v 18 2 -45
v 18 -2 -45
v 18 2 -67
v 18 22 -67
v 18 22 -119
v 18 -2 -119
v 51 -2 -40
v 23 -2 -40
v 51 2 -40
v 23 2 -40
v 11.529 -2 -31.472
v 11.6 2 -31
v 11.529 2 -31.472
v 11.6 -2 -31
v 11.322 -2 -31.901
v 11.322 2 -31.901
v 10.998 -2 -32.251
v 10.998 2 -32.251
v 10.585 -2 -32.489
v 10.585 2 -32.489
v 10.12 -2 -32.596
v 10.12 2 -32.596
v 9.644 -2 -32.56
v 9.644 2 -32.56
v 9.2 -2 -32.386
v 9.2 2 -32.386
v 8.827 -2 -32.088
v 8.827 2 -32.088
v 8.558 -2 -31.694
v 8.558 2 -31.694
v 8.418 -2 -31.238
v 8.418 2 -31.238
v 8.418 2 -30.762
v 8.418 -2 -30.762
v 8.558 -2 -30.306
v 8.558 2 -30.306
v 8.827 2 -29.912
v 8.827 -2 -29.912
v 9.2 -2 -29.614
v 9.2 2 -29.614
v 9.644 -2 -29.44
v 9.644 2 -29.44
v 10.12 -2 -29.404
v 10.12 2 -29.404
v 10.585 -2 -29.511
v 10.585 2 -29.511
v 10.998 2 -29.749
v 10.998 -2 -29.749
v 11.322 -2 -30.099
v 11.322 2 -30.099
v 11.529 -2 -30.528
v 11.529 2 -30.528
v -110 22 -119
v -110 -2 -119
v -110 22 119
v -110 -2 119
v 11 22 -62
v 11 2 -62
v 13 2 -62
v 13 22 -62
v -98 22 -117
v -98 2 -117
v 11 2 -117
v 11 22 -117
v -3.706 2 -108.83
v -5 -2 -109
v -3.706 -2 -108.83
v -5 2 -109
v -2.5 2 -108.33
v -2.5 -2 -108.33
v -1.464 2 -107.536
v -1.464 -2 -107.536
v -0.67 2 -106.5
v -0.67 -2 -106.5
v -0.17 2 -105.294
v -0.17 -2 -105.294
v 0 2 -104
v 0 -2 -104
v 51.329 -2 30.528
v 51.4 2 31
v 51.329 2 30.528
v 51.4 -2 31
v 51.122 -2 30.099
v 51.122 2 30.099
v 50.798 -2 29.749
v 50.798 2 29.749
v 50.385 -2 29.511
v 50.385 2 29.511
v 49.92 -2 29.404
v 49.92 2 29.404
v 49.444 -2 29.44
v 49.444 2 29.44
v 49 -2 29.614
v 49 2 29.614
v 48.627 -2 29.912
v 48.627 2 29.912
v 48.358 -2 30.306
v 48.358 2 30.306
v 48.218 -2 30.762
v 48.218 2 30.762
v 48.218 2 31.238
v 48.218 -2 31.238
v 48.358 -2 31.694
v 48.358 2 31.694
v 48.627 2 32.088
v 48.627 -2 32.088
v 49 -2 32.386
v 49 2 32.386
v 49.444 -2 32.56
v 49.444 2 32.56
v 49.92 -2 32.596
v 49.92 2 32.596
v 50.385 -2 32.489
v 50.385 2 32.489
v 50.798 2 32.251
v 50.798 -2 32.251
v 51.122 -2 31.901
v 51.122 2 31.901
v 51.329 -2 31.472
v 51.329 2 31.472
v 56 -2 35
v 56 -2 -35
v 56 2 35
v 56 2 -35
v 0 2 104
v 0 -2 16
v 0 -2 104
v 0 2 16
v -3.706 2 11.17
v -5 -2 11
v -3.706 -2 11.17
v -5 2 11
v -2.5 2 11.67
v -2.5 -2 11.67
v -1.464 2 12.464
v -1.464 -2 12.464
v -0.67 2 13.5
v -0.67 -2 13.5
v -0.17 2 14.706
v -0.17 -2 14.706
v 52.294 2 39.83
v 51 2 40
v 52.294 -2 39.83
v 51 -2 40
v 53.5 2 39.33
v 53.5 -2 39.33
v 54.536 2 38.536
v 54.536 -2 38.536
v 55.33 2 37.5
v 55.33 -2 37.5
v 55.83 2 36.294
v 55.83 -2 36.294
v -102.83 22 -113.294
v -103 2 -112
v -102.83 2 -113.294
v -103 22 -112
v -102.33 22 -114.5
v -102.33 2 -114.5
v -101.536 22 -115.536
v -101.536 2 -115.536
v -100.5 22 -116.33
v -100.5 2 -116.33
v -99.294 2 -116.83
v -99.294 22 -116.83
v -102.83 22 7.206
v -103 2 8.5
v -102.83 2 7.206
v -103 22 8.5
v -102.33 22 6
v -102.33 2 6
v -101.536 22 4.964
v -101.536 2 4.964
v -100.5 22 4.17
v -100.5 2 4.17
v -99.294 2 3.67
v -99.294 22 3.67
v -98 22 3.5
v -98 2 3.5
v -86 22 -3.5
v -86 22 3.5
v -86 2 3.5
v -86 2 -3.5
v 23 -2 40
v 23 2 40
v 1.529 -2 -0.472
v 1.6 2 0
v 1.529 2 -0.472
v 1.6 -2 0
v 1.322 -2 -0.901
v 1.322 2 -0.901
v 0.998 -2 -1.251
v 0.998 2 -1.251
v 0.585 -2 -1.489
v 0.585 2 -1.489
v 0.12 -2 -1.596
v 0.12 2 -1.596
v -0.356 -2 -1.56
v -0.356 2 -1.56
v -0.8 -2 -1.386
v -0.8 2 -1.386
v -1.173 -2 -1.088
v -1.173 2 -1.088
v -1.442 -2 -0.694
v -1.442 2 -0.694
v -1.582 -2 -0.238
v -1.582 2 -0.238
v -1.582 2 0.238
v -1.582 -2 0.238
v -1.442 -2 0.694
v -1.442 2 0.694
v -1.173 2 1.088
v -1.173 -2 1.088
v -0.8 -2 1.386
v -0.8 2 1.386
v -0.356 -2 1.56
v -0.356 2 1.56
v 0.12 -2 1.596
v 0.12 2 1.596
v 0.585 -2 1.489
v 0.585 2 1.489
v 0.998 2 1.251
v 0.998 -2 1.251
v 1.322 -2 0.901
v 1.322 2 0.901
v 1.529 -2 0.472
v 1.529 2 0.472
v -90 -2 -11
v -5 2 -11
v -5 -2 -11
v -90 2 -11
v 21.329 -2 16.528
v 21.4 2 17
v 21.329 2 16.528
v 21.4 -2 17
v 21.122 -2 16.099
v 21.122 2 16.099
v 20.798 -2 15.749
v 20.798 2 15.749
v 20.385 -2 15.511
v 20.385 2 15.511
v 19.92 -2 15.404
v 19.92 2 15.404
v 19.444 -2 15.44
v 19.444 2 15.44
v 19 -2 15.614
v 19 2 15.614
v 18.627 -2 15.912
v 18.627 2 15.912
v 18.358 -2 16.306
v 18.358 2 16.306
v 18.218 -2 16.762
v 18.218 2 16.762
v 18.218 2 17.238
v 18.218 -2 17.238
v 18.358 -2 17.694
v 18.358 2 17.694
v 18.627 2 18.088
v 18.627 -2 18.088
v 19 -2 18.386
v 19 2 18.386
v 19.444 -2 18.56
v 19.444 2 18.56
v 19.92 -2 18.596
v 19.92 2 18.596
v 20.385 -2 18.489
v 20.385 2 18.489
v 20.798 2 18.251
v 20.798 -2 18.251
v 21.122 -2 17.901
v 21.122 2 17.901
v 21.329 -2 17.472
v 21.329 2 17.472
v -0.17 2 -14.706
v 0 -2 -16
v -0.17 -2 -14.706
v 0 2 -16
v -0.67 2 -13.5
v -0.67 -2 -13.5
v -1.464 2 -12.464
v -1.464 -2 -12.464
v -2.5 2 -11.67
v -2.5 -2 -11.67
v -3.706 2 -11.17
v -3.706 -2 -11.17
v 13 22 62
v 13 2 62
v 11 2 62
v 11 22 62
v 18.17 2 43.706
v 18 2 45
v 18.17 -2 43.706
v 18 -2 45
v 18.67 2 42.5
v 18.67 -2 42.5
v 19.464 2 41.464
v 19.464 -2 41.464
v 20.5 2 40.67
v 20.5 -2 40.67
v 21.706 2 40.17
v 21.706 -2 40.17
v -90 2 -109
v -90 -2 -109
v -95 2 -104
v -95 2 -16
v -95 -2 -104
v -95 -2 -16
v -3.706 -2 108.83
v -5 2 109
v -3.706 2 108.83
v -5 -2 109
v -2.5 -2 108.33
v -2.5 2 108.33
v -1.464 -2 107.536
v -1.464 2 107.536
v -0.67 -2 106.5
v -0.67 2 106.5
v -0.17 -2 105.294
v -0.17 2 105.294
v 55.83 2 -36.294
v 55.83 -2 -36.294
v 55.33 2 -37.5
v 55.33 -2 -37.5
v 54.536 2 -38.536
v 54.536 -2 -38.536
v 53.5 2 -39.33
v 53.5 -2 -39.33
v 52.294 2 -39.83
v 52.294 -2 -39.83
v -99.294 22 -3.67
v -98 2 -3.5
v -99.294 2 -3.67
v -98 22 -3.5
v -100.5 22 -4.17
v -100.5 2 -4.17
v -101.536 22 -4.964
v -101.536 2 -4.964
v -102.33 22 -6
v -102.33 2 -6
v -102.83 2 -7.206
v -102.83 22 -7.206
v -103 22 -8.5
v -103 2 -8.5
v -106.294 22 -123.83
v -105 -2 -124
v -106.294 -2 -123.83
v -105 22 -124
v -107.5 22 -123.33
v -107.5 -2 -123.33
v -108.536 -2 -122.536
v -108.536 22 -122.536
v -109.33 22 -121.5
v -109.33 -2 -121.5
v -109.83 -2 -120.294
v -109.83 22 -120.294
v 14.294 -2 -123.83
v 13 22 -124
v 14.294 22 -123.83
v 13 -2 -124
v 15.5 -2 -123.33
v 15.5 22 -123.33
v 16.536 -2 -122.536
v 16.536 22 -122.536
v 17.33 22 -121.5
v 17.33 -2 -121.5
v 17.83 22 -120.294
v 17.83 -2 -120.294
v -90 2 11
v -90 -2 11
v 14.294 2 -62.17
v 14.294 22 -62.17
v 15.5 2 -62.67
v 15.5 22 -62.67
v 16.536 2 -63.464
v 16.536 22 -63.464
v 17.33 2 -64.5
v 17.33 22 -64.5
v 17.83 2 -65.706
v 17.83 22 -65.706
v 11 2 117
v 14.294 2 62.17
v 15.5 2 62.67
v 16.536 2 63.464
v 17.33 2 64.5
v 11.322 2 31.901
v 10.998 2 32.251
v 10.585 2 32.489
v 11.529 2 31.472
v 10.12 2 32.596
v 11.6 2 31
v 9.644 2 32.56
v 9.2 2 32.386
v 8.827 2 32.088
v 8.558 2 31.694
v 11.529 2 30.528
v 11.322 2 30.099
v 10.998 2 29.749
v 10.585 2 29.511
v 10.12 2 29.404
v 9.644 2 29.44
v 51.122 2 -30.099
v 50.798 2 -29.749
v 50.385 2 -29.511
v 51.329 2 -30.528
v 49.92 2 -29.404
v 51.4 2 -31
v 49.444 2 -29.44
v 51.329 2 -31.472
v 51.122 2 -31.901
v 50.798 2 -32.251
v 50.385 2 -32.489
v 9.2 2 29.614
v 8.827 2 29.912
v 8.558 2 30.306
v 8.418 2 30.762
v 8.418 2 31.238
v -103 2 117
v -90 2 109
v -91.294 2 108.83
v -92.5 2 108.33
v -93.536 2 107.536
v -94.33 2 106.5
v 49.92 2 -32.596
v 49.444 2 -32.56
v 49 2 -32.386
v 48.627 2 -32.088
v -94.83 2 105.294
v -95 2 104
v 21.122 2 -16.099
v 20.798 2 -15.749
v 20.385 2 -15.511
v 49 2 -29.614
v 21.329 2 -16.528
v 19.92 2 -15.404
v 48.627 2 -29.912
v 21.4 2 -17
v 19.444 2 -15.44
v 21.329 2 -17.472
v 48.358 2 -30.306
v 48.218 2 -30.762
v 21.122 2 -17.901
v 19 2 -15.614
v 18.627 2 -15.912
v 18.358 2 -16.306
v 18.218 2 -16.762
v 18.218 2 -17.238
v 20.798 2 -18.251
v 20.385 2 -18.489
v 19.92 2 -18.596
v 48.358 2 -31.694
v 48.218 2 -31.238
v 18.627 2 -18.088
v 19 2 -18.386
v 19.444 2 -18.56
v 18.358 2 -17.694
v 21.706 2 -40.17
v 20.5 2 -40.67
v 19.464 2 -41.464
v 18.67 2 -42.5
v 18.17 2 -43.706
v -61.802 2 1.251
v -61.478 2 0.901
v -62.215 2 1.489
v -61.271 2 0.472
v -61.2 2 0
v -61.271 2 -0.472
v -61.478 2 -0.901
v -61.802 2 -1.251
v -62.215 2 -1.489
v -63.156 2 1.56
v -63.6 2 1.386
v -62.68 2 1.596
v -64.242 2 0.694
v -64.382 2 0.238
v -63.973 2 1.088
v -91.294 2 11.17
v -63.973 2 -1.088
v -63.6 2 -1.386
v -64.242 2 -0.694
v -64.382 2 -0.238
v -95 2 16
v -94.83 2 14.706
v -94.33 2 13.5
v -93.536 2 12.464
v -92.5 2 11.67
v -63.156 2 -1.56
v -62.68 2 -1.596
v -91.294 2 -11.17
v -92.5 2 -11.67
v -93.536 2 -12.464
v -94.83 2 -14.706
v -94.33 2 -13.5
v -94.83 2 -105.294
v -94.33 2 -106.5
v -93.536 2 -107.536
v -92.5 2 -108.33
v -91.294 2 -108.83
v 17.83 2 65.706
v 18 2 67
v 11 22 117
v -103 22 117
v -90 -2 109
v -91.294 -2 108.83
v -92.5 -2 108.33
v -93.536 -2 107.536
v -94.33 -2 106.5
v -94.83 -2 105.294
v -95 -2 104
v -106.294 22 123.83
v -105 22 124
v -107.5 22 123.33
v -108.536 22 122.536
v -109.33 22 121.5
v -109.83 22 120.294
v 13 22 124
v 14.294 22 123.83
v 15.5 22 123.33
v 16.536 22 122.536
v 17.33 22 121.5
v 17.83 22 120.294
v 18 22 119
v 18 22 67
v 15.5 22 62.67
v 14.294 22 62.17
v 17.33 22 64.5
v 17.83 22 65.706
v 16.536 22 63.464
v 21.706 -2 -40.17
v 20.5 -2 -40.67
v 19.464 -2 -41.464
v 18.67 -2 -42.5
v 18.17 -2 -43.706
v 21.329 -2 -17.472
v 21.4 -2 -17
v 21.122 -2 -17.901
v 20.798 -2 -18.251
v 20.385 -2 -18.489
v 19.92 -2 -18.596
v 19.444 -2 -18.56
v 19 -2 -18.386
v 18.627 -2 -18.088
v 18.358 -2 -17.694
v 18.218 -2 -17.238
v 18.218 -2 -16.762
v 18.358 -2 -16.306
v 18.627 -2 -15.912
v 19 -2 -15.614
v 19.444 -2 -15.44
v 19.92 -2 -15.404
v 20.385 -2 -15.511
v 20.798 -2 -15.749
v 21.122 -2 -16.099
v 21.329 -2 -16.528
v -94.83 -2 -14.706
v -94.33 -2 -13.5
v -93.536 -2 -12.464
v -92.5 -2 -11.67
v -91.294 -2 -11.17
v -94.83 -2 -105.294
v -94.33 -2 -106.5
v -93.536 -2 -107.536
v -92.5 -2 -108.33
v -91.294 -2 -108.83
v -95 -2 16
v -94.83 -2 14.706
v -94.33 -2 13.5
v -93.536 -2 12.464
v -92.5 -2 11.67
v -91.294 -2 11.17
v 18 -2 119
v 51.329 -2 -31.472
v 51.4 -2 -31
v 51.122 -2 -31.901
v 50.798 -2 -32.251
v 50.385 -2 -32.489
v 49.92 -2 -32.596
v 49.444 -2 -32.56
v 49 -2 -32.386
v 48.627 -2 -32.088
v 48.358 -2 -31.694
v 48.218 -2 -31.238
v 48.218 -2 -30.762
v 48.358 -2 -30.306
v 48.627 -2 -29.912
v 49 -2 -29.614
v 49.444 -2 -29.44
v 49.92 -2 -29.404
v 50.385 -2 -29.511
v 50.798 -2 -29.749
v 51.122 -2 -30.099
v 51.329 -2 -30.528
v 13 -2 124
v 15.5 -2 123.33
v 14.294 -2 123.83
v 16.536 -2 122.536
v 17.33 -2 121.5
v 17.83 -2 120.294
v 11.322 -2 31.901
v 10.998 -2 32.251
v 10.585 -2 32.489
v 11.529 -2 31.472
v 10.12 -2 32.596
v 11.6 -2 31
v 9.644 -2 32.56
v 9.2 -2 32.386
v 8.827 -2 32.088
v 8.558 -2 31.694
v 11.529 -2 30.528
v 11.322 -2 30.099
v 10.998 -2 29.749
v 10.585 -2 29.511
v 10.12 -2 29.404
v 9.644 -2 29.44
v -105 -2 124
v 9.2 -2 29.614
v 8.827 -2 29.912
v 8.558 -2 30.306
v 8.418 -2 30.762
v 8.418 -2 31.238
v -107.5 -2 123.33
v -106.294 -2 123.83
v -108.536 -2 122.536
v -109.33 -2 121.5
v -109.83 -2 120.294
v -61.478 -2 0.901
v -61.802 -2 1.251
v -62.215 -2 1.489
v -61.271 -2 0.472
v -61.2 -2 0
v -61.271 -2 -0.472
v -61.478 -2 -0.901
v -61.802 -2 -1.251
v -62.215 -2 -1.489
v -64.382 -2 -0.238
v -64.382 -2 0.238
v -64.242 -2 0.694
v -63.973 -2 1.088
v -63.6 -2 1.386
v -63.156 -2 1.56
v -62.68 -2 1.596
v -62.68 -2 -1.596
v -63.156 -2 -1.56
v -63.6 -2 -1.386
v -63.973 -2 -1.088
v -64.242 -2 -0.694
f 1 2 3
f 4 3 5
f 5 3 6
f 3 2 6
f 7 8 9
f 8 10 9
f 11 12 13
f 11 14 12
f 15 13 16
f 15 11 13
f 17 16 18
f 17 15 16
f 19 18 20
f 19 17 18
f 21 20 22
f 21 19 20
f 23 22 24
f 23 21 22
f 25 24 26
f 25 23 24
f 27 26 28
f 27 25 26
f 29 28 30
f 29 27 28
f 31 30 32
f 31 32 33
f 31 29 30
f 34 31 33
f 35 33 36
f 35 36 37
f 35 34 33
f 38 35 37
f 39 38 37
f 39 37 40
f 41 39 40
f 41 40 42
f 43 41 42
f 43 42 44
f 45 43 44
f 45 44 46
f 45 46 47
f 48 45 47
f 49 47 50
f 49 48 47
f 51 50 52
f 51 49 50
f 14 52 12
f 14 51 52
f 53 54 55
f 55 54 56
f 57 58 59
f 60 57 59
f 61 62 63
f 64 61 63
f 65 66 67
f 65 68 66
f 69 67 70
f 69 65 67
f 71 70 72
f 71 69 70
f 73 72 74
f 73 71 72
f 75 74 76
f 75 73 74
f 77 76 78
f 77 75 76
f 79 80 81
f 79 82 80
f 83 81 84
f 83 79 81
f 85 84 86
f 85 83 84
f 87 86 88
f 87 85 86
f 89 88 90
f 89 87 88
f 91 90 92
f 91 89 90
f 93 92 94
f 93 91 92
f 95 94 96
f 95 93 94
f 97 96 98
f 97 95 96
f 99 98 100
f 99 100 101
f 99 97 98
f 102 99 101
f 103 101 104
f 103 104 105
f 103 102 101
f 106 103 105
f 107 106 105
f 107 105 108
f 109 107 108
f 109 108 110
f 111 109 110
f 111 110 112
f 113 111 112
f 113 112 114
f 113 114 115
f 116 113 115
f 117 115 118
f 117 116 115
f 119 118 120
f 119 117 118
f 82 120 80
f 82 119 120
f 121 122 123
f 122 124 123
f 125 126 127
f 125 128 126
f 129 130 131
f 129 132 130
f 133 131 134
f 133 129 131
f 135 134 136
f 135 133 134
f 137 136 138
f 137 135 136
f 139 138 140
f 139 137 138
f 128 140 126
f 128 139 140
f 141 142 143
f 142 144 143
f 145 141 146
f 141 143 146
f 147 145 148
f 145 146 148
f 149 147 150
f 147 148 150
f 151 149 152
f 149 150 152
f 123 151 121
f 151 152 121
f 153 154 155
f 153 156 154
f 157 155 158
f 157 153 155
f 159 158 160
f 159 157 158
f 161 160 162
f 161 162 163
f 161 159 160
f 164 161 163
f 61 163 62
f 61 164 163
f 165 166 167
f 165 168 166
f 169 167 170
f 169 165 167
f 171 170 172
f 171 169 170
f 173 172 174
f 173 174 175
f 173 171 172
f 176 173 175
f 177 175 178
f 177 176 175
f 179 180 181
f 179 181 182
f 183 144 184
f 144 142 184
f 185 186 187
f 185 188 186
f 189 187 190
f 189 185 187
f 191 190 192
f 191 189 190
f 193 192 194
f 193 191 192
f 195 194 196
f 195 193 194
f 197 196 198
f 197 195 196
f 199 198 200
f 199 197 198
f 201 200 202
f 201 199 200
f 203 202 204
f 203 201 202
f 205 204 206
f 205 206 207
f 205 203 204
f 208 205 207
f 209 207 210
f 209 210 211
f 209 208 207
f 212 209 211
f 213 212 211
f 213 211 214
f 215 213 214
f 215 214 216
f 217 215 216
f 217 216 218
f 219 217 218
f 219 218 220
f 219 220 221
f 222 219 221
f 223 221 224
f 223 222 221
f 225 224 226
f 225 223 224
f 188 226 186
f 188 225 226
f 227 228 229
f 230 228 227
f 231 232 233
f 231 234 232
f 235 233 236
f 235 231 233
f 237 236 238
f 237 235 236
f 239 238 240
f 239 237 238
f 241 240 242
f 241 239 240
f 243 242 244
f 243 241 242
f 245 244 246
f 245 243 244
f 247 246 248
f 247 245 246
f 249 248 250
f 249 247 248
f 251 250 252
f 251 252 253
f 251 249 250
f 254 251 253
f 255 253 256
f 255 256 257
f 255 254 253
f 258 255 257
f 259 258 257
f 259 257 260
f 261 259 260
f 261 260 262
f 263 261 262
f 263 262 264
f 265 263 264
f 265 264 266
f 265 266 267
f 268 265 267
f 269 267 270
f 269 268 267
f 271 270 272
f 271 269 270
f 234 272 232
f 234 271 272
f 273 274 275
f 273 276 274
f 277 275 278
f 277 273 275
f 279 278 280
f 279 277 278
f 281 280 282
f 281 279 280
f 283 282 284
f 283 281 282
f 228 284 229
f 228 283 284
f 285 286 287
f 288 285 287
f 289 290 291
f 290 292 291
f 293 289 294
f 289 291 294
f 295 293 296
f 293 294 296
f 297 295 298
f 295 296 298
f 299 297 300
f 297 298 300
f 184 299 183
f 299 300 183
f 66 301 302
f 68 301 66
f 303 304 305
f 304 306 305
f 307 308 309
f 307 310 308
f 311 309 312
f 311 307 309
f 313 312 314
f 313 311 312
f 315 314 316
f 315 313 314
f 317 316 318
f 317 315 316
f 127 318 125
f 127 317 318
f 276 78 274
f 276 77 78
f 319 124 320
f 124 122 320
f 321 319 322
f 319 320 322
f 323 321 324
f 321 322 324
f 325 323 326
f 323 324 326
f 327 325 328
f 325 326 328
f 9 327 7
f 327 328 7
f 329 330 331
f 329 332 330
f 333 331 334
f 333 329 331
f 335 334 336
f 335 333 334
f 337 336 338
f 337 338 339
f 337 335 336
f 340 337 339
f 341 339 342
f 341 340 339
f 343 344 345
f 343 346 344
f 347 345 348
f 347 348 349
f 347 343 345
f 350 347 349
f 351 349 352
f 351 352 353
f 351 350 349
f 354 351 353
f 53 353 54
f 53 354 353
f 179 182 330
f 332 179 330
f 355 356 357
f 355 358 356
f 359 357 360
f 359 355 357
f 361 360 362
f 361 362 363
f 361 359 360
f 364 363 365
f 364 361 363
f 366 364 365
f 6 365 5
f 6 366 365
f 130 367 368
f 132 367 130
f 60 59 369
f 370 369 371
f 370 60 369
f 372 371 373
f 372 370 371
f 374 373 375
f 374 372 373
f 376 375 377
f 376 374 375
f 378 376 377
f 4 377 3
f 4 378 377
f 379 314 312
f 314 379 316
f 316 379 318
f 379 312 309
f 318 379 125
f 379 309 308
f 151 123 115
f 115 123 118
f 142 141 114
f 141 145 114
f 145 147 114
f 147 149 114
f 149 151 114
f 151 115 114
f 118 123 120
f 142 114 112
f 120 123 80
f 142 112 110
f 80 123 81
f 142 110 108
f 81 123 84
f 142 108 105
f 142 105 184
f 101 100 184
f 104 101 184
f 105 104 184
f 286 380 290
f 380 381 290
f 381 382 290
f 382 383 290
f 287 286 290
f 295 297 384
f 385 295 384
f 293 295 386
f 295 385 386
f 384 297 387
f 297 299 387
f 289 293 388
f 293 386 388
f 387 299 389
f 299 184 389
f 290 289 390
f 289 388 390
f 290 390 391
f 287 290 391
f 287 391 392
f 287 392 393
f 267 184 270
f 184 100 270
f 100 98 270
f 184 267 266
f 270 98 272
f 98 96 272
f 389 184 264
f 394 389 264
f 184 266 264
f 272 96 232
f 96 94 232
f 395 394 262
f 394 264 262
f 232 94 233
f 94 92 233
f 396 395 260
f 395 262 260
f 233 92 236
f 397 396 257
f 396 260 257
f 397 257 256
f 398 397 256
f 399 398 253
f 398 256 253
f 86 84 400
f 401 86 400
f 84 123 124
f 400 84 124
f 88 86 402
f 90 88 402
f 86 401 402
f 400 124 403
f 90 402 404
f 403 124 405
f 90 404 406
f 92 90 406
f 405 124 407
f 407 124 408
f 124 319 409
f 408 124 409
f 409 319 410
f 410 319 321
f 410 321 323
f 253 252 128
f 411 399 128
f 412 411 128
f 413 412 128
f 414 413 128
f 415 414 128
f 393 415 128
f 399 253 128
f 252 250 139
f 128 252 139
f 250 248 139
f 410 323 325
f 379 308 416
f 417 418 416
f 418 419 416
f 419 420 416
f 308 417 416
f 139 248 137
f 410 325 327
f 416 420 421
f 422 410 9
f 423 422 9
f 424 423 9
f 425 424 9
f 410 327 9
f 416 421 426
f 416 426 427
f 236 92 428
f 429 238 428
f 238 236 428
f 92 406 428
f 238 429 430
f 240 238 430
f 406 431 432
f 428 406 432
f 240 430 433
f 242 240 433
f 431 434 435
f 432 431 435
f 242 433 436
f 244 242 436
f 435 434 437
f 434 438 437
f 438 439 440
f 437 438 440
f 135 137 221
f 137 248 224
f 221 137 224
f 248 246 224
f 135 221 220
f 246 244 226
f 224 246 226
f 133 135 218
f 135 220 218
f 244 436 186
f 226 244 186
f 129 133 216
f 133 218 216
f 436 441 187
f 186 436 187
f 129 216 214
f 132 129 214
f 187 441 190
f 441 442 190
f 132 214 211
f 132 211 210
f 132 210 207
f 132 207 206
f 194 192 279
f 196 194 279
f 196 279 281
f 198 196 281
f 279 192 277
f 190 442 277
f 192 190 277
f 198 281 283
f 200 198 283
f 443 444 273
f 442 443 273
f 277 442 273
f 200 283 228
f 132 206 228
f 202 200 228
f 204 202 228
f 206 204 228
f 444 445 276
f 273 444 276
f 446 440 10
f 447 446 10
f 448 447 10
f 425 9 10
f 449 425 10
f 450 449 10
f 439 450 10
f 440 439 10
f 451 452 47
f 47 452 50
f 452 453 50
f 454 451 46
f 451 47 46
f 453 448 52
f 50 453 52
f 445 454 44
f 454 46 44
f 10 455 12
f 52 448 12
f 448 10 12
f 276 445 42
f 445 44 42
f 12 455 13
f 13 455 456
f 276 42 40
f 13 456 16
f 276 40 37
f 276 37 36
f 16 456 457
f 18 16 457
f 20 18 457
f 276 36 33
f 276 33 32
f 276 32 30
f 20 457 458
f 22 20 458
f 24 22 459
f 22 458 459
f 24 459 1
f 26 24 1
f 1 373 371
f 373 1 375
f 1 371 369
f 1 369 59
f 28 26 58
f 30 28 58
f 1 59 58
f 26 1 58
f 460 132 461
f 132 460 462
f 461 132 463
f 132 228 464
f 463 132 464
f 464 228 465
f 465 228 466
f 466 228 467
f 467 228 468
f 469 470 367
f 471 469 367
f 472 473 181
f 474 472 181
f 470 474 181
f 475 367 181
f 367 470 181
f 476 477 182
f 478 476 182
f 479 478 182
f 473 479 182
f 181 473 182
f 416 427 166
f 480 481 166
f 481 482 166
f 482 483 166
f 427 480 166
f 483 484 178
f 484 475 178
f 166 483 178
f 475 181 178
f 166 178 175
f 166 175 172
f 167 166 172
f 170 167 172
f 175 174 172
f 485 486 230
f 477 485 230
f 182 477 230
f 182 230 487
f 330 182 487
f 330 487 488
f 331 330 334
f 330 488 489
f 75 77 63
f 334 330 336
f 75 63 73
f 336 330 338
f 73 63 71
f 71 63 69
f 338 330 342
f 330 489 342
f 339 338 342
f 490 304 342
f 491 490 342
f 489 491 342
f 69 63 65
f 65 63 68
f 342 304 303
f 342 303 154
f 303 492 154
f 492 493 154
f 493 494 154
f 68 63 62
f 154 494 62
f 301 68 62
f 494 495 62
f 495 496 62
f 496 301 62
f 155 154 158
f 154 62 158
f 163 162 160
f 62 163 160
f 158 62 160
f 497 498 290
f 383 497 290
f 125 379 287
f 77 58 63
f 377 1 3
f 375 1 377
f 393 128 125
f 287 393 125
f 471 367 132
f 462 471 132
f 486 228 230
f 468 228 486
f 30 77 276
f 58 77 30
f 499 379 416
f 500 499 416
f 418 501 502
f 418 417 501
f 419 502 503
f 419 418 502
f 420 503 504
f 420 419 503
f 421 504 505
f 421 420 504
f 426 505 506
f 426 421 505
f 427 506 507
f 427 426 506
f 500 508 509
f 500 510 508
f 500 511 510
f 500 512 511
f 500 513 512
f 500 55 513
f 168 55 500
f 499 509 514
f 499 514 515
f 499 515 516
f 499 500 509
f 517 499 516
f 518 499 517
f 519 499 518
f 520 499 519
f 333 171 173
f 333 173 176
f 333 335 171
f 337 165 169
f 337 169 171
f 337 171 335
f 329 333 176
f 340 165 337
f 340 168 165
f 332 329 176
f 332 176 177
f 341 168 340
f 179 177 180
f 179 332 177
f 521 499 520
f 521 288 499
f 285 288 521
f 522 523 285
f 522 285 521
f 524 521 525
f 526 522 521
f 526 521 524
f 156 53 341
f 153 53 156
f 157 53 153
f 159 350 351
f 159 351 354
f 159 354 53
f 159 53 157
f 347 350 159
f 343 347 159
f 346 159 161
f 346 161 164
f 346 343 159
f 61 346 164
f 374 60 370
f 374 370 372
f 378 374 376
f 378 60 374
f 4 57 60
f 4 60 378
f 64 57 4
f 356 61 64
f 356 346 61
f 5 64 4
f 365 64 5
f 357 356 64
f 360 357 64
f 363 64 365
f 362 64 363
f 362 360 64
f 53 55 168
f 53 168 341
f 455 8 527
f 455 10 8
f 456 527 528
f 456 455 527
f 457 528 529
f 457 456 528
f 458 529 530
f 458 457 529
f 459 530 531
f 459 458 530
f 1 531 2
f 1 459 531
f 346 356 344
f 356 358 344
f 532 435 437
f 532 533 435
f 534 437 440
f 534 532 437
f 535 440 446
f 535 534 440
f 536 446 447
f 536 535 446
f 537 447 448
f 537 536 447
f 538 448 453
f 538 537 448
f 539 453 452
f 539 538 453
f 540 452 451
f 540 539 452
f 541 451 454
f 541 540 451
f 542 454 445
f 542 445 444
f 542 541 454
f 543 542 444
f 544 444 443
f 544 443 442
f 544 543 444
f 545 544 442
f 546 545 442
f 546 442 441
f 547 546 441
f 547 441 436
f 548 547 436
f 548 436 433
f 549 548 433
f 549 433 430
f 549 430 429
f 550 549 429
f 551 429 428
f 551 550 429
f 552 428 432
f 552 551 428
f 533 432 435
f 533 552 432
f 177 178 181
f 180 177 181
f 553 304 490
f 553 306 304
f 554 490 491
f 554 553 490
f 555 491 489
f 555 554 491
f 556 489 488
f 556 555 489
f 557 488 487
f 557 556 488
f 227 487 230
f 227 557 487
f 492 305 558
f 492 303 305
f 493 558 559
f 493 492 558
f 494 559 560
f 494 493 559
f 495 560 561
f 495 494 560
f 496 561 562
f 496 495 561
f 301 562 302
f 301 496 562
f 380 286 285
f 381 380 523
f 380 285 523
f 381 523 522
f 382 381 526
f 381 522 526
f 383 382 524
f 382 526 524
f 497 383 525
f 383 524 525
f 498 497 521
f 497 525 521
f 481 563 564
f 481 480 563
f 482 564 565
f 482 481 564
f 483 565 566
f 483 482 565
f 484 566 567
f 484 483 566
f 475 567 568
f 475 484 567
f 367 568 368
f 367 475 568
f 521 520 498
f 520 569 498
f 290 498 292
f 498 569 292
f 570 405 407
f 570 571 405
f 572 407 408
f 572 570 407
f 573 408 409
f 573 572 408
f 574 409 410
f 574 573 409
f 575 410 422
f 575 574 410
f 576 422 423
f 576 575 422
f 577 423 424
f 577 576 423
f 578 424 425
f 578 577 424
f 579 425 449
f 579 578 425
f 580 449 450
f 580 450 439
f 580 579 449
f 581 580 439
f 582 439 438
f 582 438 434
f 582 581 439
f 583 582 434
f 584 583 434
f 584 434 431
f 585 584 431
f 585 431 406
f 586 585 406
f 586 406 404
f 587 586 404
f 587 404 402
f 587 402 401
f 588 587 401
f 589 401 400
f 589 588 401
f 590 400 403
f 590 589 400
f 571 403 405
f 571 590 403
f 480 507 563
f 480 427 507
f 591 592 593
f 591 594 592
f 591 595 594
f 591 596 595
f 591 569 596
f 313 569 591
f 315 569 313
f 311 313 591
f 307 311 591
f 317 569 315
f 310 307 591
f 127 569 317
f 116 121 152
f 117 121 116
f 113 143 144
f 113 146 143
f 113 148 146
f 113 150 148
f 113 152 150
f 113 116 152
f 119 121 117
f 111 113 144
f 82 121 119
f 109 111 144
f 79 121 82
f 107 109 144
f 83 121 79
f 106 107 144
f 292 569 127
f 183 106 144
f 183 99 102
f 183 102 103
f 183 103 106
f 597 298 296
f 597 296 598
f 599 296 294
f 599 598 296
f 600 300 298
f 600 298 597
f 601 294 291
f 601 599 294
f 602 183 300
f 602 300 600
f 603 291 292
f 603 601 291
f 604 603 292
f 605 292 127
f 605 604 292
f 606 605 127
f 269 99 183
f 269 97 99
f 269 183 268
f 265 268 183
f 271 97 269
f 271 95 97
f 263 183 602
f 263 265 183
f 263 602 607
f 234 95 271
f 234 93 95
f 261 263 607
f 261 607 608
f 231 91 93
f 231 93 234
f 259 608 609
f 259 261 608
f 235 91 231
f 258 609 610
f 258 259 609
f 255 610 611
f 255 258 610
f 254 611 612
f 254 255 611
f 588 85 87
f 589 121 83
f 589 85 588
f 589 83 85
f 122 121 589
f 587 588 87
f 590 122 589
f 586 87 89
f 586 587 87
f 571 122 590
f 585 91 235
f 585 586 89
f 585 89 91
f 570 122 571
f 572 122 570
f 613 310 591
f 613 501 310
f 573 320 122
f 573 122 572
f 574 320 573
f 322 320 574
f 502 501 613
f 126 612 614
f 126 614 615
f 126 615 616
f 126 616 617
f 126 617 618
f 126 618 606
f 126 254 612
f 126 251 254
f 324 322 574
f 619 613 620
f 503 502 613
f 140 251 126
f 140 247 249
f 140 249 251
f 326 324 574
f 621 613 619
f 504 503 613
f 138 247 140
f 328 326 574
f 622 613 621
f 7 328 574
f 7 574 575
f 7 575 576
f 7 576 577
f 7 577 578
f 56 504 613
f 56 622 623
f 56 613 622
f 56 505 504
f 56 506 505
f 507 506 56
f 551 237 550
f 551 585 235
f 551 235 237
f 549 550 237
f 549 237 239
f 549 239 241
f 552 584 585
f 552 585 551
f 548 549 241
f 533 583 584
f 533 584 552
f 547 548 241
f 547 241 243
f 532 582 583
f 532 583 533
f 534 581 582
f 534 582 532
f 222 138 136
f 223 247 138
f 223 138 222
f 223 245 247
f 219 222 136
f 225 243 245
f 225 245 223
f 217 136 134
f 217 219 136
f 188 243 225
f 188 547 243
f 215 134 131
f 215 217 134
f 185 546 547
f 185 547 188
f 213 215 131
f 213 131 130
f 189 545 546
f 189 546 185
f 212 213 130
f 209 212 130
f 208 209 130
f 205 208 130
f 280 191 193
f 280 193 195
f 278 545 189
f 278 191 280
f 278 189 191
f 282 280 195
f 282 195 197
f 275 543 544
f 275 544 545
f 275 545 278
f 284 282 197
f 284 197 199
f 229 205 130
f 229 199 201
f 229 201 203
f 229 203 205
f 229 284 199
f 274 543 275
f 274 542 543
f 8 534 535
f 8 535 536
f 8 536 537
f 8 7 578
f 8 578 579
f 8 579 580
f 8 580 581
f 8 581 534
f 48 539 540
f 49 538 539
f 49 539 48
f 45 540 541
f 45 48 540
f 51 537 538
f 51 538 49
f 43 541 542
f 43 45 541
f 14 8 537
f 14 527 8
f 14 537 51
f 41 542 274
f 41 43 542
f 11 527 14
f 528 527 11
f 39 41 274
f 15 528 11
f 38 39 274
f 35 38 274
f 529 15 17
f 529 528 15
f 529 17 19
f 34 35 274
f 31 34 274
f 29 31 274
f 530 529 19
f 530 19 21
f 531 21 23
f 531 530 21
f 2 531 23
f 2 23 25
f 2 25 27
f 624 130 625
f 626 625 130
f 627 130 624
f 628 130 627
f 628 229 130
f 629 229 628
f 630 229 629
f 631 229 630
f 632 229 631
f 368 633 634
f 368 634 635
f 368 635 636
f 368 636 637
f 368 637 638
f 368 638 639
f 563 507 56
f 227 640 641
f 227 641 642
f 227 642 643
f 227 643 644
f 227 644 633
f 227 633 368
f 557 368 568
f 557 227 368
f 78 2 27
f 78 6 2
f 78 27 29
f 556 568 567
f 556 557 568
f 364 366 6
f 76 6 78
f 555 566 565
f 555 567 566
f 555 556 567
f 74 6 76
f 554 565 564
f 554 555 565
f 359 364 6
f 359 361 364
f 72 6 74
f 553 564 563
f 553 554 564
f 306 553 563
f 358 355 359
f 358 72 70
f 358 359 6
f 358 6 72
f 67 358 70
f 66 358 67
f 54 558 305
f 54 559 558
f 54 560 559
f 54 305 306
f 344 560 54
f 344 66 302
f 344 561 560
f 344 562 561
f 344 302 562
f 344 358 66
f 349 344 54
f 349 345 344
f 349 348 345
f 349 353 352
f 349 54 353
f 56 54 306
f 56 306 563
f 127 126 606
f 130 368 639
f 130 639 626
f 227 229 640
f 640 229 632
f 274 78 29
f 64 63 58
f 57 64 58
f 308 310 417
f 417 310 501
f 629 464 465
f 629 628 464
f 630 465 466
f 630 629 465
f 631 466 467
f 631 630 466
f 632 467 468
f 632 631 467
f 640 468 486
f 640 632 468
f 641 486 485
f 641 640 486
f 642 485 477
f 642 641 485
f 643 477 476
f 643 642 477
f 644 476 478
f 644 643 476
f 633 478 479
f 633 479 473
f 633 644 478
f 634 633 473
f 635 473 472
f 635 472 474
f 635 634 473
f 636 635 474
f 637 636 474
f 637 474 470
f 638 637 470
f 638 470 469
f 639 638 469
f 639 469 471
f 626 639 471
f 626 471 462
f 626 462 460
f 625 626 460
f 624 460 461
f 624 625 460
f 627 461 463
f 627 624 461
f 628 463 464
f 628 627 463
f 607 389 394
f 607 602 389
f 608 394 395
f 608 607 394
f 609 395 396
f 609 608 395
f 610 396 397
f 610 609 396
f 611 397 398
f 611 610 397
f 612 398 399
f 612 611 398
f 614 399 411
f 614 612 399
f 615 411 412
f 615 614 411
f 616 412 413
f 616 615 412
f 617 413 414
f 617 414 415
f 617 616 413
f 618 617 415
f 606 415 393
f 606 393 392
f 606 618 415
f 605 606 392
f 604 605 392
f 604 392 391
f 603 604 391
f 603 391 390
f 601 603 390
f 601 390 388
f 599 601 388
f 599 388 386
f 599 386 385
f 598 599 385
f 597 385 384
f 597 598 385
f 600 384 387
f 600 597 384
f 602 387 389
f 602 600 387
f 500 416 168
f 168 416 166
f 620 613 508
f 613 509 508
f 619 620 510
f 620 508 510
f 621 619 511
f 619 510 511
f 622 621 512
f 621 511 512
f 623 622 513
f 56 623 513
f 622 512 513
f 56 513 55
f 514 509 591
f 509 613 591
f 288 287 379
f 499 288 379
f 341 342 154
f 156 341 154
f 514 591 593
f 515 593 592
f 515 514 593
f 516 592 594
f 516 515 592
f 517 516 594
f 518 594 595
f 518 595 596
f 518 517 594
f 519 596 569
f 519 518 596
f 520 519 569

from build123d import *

# Parameters (mm, degrees)
SKETCH1_R           = 1.6
BOSS_EXTRUDE1_DEPTH = 2
BOSS_EXTRUDE2_DEPTH = 20
FILLET1_R           = 5


with BuildPart() as part:
    # Sketch1 → Boss-Extrude1 (new body, symmetric)
    with BuildSketch(Plane(origin=(0, 0, 0), x_dir=(1, 0, 0), z_dir=(0, 1, 0))):
        Polygon((18, 40), (56, 40), (56, -40), (18, -40), (18, -124), (-110, -124), (-110, -22.904637916), (-110, 22.904637916), (-110, 124), (18, 124), align=None)
        Circle(SKETCH1_R, mode=Mode.SUBTRACT)
        with Locations((-62.8, 0)):
            Circle(SKETCH1_R, mode=Mode.SUBTRACT)
        with Locations((10, 31)):
            Circle(SKETCH1_R, mode=Mode.SUBTRACT)
        with Locations((49.8, 31)):
            Circle(SKETCH1_R, mode=Mode.SUBTRACT)
        with Locations((49.8, -31)):
            Circle(SKETCH1_R, mode=Mode.SUBTRACT)
        with Locations((10, -31)):
            Circle(SKETCH1_R, mode=Mode.SUBTRACT)
        with Locations((19.8, 17)):
            Circle(SKETCH1_R, mode=Mode.SUBTRACT)
        with Locations((19.8, -17)):
            Circle(SKETCH1_R, mode=Mode.SUBTRACT)
        Polygon((0, 11), (-95, 11), (-95, 109), (0, 109), (0, 40), align=None, mode=Mode.SUBTRACT)
        Polygon((0, -11), (0, -40), (0, -109), (-95, -109), (-95, -11), align=None, mode=Mode.SUBTRACT)
    extrude(amount=BOSS_EXTRUDE1_DEPTH, both=True)

    # Sketch2 → Boss-Extrude2 (add)
    with BuildSketch(Plane(origin=(0, 2, 0), x_dir=(1, 0, 0), z_dir=(0, 1, 0))):
        Polygon((18, 124), (-110, 124), (-110, -124), (18, -124), (18, -117), (18, -62), (11, -62), (11, -117), (-103, -117), (-103, -3.5), (-86, -3.5), (-86, 3.5), (-103, 3.5), (-103, 117), (11, 117), (11, 62), (18, 62), (18, 117), align=None)
    extrude(amount=BOSS_EXTRUDE2_DEPTH)

    # Fillet1
    fillet1_edges = [part.edges().sort_by_distance(p)[0] for p in [
        (18, 12, 62),
        (-103, 12, 3.5),
        (-103, 12, -3.5),
        (-103, 12, -117),
        (18, 12, -62),
        (18, 0, 40),
        (18, 10, 124),
        (-110, 10, 124),
        (-110, 10, -124),
        (18, 10, -124),
        (18, 0, -40),
        (56, 0, -40),
        (56, 0, 40),
        (0, 0, -11),
        (0, 0, -109),
        (-95, 0, -109),
        (-95, 0, -11),
        (0, 0, 11),
        (-95, 0, 11),
        (-95, 0, 109),
        (0, 0, 109),
    ]]
    fillet(fillet1_edges, radius=FILLET1_R)


solid = part.part
